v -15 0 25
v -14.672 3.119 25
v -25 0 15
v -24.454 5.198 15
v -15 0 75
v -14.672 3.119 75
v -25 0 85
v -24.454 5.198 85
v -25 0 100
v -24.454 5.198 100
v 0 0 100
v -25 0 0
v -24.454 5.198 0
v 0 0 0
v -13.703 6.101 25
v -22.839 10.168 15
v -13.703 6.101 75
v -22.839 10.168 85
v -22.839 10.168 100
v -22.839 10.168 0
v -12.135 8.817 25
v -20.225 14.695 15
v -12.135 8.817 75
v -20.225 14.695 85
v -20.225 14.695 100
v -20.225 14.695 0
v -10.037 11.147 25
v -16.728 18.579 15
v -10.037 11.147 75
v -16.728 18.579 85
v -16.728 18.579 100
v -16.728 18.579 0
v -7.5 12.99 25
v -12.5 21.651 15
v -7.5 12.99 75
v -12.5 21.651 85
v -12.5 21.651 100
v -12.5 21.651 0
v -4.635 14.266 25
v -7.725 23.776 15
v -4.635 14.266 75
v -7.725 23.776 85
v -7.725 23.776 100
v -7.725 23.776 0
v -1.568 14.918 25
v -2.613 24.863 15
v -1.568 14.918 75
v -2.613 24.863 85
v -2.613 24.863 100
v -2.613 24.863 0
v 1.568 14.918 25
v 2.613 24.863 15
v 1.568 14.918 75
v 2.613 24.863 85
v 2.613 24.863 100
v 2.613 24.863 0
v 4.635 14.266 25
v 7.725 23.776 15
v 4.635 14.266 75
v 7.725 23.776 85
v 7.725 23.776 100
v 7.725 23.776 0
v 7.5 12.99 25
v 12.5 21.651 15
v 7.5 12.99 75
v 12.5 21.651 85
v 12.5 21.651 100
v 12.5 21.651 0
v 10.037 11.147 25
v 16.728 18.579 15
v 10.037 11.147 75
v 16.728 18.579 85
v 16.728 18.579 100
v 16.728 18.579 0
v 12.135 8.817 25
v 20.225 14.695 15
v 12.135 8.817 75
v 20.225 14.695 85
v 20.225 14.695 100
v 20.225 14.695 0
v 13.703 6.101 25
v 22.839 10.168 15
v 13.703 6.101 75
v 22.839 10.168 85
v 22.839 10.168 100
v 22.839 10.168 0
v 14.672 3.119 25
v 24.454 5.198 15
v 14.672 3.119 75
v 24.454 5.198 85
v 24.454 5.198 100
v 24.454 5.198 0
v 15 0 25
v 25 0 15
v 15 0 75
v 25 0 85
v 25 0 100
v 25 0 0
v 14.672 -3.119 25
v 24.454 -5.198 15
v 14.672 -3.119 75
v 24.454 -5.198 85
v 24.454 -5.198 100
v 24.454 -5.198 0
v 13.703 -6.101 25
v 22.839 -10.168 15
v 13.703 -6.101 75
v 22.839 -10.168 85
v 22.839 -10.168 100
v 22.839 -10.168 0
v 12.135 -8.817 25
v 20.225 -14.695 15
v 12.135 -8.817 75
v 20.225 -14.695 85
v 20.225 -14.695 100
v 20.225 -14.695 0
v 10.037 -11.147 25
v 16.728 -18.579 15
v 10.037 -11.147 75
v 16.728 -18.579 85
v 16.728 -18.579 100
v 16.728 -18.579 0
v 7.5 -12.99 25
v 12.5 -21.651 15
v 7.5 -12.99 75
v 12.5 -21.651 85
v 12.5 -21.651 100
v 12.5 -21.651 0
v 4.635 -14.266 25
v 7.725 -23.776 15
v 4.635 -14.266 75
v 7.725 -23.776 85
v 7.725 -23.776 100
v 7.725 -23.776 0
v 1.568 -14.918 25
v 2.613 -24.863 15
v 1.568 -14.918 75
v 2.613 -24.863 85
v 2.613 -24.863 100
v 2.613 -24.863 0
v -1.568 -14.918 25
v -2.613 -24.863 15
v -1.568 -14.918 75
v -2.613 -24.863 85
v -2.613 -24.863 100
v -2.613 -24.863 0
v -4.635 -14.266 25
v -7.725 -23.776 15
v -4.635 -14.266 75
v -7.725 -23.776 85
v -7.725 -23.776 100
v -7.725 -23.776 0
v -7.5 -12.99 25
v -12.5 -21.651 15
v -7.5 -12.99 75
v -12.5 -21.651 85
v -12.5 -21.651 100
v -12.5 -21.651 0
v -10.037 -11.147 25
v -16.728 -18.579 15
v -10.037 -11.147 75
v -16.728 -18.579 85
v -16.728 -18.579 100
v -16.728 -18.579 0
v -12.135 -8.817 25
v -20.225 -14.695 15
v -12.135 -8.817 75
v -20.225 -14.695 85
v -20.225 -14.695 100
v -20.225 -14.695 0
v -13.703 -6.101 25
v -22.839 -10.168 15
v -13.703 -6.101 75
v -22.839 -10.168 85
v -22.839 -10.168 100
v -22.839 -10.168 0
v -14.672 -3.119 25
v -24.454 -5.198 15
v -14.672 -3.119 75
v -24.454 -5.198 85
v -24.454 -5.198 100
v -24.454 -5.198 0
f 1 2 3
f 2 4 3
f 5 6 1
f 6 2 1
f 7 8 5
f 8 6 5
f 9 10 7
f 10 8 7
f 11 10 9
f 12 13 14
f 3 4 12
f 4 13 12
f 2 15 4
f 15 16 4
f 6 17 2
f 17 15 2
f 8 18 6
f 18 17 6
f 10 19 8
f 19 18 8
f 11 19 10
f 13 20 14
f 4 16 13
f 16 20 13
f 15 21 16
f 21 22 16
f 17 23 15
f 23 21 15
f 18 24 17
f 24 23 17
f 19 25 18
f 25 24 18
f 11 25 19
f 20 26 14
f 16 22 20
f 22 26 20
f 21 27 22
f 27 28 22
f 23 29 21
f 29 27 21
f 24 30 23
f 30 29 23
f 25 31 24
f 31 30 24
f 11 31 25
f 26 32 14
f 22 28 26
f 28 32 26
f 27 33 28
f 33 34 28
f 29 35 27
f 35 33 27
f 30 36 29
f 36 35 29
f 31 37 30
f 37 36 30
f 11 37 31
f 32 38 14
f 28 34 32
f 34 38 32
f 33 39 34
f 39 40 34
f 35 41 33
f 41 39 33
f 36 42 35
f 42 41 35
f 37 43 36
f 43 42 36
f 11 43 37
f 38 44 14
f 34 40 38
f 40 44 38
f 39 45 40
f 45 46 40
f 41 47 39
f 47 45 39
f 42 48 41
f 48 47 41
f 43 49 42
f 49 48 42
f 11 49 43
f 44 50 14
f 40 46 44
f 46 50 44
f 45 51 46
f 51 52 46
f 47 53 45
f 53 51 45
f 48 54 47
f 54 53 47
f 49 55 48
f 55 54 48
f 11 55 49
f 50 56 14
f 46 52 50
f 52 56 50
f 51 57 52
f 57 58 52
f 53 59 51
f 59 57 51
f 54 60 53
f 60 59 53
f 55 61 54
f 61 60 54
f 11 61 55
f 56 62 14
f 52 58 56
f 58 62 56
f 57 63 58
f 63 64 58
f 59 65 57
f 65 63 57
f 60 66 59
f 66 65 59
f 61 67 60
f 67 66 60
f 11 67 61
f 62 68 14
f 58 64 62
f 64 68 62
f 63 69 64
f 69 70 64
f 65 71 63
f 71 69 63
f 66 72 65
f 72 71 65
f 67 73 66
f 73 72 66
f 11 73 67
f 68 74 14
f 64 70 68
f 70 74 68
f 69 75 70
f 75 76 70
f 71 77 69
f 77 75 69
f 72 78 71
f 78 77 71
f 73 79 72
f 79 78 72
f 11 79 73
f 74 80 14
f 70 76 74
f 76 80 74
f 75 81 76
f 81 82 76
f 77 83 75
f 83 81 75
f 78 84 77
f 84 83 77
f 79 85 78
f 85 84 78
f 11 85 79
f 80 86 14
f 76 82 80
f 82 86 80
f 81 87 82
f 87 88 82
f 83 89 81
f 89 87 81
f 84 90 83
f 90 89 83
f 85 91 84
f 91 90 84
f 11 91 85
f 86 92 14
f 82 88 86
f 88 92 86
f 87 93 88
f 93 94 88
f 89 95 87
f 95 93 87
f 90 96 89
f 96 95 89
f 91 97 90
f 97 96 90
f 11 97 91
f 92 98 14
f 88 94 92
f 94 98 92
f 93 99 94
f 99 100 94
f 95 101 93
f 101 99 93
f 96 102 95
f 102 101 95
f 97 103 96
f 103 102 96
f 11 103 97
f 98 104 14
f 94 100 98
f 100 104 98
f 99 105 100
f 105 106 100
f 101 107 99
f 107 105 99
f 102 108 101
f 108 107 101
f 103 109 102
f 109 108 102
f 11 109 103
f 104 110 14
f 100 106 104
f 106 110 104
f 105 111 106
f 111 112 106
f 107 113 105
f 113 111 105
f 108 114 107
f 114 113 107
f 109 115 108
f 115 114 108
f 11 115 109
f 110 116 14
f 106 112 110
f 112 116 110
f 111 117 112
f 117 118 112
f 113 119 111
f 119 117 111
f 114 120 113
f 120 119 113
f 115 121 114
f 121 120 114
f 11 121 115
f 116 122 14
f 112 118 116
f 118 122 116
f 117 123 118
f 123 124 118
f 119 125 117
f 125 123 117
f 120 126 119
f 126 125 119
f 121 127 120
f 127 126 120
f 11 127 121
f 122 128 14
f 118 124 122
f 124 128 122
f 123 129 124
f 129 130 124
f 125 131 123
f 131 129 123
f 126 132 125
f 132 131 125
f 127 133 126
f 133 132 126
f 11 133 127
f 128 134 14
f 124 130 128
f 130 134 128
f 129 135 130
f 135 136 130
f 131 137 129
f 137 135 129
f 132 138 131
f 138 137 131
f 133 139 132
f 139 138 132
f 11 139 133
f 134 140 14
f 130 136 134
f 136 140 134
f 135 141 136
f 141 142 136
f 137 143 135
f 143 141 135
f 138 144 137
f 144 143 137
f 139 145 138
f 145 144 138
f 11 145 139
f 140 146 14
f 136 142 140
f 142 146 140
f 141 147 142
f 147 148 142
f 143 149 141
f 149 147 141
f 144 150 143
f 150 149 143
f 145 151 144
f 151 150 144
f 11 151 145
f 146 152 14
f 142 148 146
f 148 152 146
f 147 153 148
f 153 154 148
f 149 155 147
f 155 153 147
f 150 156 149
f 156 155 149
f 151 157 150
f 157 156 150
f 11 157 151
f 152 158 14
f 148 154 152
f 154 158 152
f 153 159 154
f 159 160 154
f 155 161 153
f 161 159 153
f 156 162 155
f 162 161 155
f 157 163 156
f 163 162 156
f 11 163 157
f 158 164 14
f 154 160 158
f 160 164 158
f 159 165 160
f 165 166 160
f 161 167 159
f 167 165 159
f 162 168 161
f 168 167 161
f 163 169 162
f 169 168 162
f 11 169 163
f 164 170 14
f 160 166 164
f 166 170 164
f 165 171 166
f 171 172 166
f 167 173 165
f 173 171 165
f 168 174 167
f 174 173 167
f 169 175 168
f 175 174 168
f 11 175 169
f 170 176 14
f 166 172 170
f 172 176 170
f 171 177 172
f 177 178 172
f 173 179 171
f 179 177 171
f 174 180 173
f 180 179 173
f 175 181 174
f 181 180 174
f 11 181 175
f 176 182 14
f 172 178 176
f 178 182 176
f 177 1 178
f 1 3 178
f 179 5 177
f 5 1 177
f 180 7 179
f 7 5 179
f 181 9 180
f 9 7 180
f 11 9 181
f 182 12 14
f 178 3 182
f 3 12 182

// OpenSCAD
module pillar(h, baseH, outerD, innerD, angle){
 chamfer_h = tan(angle)*(outerD-innerD)/2;
 rotate_extrude()
  polygon([
   [0, 0], 
   [outerD/2, 0], 
   [outerD/2, baseH],
   [innerD/2, baseH+chamfer_h],
   [innerD/2, h-(baseH+chamfer_h)],
   [outerD/2, h-baseH],
   [outerD/2, h],
   [0, h]]);
}

pillar(h=100, baseH=15, outerD=50, innerD=30, angle=45);
